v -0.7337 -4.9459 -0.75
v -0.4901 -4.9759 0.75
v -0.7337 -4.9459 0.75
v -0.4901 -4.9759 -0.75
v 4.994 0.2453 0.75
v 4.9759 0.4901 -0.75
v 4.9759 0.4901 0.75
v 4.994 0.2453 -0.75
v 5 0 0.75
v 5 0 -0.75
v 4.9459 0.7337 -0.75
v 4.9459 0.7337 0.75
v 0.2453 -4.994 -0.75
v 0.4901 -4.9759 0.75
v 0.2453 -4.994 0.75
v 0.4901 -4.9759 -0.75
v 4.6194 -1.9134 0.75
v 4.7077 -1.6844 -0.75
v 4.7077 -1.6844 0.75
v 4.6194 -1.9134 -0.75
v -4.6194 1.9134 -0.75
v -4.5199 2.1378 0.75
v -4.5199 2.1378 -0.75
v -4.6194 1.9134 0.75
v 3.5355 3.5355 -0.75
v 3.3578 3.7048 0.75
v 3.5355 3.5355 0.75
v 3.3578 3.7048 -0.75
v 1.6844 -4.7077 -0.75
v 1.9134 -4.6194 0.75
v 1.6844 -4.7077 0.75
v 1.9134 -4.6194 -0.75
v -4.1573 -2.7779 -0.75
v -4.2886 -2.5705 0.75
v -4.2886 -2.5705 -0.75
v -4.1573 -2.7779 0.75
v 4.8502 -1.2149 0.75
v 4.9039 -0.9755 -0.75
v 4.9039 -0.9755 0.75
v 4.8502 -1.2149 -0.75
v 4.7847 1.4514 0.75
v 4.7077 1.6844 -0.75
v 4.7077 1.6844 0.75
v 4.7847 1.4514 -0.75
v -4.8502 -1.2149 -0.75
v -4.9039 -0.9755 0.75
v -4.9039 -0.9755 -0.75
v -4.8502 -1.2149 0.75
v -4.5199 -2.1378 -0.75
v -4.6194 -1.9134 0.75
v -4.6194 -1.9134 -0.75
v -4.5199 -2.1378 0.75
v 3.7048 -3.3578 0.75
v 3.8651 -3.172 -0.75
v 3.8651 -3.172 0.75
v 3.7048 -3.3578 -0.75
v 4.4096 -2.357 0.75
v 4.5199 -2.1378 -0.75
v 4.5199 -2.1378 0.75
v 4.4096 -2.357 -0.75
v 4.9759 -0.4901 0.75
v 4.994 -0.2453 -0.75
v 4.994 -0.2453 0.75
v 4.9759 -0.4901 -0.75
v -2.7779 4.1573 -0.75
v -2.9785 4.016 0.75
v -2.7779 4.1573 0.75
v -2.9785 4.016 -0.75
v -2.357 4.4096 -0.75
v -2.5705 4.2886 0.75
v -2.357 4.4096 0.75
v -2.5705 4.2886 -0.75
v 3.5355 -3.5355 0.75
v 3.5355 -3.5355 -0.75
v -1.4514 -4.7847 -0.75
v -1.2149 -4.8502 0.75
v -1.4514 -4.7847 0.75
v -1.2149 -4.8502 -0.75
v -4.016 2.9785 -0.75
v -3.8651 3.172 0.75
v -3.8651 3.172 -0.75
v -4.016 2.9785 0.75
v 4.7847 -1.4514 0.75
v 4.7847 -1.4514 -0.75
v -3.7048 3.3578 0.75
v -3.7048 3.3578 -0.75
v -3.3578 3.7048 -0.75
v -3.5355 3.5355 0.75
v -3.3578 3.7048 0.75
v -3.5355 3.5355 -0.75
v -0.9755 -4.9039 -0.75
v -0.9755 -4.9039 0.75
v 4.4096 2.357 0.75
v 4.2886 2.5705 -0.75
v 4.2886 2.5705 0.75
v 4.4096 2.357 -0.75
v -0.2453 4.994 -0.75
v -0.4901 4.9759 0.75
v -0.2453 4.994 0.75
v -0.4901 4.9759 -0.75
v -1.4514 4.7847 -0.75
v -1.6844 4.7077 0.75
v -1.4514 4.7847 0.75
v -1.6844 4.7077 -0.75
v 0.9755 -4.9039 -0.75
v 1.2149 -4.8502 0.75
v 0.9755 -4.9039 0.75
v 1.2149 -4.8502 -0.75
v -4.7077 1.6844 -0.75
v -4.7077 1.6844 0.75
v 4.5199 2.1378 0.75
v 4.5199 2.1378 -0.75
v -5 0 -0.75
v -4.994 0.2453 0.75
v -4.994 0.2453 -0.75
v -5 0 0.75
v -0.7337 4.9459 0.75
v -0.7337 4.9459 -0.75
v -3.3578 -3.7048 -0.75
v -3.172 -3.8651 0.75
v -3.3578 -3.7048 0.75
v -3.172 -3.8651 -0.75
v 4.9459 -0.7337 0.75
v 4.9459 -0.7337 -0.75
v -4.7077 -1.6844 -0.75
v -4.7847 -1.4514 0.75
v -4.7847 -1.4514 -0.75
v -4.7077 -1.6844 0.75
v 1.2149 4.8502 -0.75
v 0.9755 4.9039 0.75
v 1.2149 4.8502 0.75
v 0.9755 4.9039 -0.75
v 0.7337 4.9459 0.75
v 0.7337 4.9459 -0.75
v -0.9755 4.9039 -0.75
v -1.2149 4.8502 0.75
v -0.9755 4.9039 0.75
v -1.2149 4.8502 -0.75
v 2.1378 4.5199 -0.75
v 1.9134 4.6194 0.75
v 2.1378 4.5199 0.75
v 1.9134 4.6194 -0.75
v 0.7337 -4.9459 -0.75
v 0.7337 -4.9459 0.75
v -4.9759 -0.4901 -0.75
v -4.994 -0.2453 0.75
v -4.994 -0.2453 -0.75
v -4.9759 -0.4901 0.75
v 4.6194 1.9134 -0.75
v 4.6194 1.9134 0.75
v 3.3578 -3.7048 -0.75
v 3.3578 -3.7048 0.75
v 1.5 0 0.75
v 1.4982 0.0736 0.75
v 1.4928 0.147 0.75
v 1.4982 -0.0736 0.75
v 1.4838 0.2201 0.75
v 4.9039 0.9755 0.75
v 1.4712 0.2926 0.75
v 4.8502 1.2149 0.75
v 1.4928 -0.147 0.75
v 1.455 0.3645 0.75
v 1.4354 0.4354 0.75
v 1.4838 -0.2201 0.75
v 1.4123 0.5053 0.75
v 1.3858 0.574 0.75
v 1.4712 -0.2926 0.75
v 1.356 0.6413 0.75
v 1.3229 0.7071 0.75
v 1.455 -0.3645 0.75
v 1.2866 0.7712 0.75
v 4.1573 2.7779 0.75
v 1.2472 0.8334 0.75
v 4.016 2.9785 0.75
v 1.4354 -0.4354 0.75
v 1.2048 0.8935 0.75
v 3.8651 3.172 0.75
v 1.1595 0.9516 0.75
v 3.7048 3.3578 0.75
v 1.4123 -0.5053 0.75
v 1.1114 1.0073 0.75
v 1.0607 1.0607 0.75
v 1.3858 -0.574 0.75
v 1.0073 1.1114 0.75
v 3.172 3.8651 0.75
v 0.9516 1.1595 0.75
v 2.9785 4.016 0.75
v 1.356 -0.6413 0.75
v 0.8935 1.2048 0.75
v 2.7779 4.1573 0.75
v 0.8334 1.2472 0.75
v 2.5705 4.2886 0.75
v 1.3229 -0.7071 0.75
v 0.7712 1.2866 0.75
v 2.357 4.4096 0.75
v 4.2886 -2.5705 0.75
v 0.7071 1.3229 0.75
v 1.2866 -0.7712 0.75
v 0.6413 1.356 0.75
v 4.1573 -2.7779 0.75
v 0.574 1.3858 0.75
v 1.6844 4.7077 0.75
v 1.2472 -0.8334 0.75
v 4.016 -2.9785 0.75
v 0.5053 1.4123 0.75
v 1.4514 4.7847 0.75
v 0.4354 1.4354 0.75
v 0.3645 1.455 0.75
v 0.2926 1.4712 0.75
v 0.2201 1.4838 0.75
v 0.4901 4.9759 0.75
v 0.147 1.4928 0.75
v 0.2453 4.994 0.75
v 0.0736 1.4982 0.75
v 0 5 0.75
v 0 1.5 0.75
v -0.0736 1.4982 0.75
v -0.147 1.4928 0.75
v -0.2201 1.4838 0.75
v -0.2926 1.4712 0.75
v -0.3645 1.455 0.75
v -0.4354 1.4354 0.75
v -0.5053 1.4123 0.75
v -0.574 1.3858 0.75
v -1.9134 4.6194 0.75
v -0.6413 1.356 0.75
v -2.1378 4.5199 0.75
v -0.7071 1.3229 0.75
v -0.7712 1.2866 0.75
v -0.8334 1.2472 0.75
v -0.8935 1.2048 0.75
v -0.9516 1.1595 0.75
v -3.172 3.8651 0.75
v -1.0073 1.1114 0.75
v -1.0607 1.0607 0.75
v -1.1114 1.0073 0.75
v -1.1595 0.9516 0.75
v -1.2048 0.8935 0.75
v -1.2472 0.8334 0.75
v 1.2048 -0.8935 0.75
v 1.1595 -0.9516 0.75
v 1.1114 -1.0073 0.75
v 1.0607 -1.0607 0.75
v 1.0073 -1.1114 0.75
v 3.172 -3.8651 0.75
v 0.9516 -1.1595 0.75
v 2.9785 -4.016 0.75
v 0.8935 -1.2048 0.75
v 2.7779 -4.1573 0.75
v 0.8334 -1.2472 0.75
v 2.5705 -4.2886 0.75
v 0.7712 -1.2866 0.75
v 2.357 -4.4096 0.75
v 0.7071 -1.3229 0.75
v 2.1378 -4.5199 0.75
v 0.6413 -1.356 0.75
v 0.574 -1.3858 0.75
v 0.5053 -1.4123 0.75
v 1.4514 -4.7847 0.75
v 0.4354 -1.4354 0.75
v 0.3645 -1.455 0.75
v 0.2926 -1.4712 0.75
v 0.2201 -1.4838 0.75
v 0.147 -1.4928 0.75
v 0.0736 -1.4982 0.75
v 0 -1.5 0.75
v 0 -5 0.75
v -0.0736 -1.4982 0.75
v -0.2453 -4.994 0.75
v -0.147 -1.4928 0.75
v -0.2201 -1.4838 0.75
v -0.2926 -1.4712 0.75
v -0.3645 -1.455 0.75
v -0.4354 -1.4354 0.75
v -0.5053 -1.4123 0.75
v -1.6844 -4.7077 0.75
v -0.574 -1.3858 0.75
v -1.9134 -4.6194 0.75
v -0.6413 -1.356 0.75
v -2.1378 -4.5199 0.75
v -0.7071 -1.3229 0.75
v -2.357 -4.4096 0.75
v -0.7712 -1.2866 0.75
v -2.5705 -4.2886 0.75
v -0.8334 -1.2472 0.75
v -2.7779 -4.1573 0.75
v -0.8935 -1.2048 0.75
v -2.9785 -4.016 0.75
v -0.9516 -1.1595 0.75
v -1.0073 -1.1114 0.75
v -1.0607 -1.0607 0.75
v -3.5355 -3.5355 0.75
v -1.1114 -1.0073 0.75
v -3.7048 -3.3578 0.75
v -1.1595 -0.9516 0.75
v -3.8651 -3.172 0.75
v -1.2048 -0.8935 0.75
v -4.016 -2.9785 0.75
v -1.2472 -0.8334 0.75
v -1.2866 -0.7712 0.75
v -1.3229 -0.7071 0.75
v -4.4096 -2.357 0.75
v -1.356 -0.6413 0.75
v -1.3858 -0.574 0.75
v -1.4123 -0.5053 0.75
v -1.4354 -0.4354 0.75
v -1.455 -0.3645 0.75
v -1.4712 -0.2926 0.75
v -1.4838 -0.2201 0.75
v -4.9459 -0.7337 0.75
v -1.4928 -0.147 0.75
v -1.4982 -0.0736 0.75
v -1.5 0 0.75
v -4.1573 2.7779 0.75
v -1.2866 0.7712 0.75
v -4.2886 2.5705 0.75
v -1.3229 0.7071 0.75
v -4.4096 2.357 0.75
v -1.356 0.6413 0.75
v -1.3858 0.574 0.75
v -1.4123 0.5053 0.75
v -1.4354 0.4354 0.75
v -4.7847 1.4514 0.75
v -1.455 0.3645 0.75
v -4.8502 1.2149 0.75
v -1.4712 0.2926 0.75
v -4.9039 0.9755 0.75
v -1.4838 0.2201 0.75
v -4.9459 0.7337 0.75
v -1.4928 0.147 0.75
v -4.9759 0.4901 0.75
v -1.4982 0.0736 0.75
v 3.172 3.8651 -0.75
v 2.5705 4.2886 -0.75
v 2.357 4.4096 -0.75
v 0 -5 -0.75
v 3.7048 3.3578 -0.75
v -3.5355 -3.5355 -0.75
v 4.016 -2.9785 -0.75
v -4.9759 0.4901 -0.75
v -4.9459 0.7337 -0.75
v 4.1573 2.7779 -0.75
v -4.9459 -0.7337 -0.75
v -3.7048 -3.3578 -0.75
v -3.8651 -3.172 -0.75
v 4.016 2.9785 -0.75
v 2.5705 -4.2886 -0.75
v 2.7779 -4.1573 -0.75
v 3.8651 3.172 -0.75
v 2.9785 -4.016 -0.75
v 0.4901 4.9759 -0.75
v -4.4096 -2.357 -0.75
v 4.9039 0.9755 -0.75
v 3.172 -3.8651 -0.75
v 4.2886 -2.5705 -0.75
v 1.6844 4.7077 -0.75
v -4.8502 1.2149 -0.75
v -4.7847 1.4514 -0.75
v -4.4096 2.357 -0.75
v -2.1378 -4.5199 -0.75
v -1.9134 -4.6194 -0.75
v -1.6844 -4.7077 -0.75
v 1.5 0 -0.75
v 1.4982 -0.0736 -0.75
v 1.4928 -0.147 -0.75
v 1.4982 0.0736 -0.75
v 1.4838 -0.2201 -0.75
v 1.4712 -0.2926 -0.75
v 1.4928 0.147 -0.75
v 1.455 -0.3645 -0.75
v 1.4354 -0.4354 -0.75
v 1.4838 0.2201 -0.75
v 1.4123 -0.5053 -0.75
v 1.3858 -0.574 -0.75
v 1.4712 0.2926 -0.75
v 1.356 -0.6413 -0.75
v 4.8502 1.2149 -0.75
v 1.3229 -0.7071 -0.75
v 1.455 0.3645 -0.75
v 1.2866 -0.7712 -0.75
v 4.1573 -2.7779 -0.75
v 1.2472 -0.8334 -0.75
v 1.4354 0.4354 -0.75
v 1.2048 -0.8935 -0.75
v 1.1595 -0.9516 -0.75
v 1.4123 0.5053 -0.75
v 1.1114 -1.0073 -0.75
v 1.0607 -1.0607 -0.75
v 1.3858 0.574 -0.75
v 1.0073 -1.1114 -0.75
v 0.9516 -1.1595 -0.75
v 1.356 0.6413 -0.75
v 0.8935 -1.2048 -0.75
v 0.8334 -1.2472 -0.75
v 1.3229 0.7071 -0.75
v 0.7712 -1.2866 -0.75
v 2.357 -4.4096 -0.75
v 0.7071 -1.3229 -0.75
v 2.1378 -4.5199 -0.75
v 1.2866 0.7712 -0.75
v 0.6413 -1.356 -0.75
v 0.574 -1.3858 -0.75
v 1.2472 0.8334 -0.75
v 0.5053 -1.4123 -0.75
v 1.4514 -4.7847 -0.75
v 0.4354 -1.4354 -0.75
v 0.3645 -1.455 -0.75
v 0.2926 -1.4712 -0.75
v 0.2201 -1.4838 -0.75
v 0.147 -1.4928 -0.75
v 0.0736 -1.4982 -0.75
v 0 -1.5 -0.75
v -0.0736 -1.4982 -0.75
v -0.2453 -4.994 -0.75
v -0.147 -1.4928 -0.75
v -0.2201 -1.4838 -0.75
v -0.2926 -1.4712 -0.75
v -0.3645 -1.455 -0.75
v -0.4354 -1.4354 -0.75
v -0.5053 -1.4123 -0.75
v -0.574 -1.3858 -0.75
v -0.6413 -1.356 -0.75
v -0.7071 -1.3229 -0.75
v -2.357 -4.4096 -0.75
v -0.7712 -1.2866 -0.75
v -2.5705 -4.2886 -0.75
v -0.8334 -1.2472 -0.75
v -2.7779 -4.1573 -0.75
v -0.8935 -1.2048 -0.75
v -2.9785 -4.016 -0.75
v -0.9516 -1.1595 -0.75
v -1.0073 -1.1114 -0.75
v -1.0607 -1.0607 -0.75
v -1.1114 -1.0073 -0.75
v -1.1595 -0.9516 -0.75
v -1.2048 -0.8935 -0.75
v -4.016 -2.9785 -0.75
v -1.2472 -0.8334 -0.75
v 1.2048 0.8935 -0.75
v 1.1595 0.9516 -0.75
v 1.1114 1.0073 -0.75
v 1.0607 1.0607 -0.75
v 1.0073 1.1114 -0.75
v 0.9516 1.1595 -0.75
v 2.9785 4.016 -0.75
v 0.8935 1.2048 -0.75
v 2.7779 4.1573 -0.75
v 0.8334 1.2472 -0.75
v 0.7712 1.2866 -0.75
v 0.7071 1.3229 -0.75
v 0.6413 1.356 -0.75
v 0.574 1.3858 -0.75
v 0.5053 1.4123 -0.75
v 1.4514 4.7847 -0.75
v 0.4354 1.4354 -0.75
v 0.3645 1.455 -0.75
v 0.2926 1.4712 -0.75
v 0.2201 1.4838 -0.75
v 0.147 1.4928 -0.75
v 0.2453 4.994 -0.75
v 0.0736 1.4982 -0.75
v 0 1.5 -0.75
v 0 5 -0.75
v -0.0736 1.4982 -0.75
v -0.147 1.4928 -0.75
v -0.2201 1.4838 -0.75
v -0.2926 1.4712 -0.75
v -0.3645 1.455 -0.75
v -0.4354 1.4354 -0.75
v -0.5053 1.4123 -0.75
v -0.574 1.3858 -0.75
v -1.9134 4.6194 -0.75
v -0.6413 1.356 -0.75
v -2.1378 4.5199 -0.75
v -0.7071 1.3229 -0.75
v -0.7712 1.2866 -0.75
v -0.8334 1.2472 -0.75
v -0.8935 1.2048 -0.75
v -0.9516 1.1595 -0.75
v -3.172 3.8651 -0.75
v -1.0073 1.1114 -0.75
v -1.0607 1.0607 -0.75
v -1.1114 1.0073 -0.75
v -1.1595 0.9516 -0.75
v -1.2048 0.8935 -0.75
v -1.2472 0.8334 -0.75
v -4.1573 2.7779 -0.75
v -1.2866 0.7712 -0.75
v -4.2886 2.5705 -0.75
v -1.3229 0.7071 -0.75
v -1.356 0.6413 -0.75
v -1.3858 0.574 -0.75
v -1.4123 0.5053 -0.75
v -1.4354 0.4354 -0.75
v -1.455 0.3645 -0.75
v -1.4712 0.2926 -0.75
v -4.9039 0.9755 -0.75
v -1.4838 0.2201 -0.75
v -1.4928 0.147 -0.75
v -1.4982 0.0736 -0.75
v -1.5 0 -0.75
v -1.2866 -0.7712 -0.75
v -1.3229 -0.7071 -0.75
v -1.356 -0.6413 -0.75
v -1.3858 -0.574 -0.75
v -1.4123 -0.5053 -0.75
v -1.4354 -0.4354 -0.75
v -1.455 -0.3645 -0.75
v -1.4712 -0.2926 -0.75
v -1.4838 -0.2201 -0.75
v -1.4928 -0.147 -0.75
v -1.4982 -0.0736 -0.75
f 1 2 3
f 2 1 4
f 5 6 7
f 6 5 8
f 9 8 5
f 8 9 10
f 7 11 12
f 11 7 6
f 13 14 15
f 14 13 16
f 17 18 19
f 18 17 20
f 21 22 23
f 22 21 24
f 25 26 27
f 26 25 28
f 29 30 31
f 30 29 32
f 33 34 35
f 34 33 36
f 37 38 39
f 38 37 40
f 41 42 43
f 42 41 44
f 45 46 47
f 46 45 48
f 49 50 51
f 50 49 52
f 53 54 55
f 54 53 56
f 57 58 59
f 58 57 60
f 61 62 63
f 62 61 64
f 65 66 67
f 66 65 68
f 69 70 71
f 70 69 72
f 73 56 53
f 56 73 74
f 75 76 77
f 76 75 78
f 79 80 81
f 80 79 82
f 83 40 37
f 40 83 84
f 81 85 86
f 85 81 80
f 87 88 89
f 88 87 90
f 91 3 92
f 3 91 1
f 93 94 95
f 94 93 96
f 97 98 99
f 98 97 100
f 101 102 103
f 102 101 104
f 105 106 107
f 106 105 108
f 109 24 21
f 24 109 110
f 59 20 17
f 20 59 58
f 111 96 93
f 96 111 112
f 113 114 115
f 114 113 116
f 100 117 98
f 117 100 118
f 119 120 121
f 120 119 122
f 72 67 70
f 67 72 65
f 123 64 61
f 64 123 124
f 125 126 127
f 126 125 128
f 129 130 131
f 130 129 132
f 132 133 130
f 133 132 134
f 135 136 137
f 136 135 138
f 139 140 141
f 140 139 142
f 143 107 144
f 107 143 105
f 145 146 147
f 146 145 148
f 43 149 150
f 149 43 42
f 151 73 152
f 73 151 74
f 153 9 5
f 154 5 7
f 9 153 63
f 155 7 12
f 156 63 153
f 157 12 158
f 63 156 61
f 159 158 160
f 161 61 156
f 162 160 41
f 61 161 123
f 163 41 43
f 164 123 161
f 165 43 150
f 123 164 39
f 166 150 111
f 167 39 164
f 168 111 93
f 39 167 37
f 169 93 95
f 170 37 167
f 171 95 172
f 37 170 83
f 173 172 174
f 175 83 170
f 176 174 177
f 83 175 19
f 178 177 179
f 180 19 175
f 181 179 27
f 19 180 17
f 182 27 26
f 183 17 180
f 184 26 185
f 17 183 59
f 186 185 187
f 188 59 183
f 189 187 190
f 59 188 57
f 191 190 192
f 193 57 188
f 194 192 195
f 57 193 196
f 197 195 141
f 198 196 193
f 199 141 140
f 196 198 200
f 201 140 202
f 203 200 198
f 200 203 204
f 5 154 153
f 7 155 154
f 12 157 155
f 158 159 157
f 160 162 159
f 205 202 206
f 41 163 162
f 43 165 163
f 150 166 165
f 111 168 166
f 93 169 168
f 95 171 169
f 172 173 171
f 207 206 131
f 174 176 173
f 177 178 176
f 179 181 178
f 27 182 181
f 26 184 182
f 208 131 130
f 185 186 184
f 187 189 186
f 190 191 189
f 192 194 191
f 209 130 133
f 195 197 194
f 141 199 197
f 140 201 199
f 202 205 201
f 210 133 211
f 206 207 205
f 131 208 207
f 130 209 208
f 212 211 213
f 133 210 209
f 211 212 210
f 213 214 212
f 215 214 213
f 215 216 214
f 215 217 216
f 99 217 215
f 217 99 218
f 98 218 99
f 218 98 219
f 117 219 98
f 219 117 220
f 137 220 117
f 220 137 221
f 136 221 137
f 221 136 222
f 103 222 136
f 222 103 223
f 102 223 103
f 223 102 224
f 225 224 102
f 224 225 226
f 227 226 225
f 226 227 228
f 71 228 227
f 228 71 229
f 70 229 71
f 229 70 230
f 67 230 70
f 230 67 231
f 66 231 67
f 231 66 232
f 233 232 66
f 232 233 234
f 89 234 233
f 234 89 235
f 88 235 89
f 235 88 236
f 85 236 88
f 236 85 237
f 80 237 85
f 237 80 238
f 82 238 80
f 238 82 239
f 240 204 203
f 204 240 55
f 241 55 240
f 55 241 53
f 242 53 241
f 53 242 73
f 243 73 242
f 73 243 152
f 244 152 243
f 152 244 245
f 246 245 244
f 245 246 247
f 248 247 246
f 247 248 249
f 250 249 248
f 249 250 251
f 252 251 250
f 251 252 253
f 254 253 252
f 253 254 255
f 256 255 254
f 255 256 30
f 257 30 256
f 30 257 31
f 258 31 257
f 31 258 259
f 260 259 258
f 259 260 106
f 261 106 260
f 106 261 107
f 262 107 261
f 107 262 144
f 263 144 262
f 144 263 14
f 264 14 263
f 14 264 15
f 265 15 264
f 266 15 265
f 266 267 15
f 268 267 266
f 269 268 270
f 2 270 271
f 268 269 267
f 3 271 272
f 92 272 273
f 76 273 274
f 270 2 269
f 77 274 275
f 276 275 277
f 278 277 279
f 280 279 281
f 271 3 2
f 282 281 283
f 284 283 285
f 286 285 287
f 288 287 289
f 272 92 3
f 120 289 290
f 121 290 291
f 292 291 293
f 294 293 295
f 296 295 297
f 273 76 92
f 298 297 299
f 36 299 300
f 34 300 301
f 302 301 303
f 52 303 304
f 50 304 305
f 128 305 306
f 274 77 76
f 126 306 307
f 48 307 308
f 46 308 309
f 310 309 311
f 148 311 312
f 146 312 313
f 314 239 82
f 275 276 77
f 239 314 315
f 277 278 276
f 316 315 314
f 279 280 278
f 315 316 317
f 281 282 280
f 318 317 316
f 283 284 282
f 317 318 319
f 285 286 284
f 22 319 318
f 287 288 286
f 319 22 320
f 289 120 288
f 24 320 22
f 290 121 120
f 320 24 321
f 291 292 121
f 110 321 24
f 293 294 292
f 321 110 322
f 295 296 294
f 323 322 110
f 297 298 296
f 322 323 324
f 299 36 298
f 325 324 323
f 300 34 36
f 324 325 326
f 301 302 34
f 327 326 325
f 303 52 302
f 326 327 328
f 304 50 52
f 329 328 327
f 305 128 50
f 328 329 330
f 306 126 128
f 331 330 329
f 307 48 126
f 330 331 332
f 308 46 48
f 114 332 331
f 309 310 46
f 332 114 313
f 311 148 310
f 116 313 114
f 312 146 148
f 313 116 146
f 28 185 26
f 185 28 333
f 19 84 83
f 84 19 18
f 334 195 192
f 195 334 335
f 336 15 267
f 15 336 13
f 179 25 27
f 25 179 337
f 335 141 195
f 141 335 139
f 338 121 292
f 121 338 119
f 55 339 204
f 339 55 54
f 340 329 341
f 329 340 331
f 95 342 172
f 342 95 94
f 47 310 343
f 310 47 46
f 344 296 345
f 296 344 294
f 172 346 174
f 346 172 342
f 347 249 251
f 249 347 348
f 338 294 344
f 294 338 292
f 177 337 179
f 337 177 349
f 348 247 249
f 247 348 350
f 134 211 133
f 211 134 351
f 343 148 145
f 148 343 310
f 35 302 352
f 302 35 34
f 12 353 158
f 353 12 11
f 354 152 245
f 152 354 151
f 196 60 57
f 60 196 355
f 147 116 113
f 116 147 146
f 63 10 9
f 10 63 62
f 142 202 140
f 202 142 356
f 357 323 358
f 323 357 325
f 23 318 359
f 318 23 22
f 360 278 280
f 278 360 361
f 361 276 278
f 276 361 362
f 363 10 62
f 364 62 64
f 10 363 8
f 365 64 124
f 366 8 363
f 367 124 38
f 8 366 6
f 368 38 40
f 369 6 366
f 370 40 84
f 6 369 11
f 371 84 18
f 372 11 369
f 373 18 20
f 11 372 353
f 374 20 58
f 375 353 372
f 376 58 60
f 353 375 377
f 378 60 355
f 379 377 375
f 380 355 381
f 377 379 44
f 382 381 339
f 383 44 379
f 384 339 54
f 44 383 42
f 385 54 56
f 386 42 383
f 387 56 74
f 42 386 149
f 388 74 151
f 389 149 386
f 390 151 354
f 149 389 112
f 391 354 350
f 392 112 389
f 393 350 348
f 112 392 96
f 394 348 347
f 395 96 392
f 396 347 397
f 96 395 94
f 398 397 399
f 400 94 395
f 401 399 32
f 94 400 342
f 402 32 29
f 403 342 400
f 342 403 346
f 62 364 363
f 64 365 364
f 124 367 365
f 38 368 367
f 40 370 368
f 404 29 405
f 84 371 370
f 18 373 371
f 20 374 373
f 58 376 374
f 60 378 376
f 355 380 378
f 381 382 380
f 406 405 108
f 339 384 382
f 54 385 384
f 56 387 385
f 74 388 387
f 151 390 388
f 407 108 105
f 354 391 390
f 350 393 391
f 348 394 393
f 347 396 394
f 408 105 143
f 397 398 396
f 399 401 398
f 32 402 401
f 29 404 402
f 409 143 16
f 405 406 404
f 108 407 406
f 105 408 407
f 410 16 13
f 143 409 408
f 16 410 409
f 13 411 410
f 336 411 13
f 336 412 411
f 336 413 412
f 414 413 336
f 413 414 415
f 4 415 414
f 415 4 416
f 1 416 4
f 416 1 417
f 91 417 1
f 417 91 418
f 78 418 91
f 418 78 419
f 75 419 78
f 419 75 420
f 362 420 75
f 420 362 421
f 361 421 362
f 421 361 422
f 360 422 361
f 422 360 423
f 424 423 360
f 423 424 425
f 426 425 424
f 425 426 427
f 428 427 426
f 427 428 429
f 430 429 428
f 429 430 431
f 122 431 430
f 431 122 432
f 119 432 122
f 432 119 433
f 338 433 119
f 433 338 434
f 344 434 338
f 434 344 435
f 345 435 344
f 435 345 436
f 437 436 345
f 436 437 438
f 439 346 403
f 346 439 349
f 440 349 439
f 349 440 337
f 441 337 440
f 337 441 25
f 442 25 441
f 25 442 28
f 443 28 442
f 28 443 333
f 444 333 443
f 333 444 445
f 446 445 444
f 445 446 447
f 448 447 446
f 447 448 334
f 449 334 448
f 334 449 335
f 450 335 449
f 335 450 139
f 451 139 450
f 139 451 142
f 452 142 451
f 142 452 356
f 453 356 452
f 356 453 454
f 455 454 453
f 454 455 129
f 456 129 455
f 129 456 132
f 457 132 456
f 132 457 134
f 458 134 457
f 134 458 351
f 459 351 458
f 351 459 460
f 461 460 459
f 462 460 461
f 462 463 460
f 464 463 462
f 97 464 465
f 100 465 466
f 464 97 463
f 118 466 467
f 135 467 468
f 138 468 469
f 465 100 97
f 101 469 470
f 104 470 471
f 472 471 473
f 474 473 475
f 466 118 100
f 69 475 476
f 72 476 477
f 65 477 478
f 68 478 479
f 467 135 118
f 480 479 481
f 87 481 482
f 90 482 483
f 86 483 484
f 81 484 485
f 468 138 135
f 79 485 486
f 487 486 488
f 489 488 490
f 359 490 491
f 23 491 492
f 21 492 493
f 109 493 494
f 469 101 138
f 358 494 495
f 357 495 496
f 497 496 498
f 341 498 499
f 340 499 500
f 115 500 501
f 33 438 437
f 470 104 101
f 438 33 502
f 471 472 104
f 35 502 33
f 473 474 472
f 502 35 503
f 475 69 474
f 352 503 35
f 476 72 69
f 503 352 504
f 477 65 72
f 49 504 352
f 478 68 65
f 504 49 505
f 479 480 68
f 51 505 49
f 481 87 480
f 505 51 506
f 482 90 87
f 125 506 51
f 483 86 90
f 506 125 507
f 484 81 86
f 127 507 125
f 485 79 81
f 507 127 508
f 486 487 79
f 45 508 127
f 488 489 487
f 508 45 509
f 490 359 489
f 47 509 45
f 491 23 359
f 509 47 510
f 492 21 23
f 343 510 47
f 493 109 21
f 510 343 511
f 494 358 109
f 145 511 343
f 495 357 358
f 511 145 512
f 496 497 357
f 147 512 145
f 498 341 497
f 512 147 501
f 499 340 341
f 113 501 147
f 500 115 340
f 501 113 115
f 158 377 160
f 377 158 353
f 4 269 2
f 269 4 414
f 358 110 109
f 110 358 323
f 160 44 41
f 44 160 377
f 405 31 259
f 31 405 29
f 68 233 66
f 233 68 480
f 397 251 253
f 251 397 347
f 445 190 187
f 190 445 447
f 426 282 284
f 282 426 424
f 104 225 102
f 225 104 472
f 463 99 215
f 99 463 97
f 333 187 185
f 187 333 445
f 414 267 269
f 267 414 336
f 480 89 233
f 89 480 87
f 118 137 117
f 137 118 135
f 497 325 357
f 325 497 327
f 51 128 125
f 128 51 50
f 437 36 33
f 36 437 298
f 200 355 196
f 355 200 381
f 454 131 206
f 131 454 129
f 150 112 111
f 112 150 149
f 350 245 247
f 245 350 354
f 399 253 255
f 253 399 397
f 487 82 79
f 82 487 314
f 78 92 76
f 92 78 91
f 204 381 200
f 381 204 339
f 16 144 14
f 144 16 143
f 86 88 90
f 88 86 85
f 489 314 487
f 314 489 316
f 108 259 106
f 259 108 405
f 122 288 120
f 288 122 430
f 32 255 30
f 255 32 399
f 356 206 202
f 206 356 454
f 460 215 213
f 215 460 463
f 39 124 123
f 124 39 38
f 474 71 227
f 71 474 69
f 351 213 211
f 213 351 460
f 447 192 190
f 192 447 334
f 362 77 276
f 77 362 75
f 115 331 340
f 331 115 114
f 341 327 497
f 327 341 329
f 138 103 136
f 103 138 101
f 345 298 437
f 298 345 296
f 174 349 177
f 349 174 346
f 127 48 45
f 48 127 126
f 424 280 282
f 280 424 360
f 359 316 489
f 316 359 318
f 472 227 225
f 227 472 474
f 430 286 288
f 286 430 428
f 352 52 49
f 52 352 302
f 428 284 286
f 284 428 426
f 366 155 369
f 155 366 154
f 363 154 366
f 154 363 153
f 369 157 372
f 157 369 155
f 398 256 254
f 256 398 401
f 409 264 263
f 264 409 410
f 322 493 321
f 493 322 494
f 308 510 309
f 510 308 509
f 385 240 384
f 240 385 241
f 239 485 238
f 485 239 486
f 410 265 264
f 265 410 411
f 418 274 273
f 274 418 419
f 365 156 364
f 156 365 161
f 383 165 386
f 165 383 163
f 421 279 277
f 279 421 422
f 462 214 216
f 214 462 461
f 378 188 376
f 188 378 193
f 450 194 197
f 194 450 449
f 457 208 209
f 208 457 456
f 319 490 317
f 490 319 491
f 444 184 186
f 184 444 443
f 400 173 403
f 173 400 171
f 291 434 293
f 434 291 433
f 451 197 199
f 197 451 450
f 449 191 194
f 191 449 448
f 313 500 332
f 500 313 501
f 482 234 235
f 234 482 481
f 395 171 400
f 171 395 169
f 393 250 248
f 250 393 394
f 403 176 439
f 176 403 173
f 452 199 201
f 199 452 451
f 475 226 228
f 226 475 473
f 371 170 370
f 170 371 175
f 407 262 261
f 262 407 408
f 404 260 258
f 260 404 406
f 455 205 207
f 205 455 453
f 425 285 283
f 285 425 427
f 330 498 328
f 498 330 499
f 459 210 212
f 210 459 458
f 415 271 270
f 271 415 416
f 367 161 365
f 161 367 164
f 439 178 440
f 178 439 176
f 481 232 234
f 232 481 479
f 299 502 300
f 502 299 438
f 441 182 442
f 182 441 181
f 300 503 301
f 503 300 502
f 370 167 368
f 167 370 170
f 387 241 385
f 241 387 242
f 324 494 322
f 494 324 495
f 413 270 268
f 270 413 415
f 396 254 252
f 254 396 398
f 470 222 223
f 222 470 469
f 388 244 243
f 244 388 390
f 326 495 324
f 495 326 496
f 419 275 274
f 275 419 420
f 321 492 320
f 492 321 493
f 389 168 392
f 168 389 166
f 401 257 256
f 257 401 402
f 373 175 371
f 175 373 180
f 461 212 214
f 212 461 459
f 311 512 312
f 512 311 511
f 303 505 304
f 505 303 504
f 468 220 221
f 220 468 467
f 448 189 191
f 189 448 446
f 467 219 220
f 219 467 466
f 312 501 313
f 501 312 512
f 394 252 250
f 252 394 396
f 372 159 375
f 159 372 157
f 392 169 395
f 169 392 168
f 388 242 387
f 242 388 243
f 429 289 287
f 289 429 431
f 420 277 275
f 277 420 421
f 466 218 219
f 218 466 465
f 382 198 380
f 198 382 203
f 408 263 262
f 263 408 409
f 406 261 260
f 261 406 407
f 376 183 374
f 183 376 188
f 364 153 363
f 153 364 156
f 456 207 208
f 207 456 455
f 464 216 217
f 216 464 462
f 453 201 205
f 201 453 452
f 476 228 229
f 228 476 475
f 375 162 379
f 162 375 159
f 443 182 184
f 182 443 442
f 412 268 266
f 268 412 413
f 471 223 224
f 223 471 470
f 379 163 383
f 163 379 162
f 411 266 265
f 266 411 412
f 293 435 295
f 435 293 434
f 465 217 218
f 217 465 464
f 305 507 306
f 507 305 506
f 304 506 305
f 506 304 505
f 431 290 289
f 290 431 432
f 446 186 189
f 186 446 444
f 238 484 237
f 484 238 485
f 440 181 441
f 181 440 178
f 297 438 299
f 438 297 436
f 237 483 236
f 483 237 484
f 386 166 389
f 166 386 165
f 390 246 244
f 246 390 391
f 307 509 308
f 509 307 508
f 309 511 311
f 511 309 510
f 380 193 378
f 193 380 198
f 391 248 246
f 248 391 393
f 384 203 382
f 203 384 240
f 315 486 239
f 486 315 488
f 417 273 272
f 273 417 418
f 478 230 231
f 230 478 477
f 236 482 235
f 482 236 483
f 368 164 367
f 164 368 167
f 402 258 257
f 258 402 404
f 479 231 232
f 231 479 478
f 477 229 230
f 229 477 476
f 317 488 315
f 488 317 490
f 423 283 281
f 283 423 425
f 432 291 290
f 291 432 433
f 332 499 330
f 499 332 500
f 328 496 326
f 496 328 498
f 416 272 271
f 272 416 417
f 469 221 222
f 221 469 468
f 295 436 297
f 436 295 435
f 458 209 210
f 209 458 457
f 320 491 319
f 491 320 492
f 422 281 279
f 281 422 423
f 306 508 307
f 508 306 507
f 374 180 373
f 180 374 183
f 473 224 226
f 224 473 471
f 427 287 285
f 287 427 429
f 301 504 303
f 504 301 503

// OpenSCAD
// Rubber washer: 3.0mm inner hole, 10.0mm outer diameter, 1.5mm thickness

inner_diameter_mm = 3.0;   //[1.5:6.0:0.1]
outer_diameter_mm = 10.0;  //[5.0:20.0:0.1]
thickness_mm      = 1.5;   //[0.75:3.0:0.05]

inner_radius_mm = inner_diameter_mm / 2;
outer_radius_mm = outer_diameter_mm / 2;

$fn = 128;

module washer() {
  color([0.2, 0.2, 0.2])  // rubber
  difference() {
    cylinder(r = outer_radius_mm, h = thickness_mm, center = true);
    cylinder(r = inner_radius_mm, h = thickness_mm + 0.2, center = true); // ensure clean through-hole
  }
}

washer();
